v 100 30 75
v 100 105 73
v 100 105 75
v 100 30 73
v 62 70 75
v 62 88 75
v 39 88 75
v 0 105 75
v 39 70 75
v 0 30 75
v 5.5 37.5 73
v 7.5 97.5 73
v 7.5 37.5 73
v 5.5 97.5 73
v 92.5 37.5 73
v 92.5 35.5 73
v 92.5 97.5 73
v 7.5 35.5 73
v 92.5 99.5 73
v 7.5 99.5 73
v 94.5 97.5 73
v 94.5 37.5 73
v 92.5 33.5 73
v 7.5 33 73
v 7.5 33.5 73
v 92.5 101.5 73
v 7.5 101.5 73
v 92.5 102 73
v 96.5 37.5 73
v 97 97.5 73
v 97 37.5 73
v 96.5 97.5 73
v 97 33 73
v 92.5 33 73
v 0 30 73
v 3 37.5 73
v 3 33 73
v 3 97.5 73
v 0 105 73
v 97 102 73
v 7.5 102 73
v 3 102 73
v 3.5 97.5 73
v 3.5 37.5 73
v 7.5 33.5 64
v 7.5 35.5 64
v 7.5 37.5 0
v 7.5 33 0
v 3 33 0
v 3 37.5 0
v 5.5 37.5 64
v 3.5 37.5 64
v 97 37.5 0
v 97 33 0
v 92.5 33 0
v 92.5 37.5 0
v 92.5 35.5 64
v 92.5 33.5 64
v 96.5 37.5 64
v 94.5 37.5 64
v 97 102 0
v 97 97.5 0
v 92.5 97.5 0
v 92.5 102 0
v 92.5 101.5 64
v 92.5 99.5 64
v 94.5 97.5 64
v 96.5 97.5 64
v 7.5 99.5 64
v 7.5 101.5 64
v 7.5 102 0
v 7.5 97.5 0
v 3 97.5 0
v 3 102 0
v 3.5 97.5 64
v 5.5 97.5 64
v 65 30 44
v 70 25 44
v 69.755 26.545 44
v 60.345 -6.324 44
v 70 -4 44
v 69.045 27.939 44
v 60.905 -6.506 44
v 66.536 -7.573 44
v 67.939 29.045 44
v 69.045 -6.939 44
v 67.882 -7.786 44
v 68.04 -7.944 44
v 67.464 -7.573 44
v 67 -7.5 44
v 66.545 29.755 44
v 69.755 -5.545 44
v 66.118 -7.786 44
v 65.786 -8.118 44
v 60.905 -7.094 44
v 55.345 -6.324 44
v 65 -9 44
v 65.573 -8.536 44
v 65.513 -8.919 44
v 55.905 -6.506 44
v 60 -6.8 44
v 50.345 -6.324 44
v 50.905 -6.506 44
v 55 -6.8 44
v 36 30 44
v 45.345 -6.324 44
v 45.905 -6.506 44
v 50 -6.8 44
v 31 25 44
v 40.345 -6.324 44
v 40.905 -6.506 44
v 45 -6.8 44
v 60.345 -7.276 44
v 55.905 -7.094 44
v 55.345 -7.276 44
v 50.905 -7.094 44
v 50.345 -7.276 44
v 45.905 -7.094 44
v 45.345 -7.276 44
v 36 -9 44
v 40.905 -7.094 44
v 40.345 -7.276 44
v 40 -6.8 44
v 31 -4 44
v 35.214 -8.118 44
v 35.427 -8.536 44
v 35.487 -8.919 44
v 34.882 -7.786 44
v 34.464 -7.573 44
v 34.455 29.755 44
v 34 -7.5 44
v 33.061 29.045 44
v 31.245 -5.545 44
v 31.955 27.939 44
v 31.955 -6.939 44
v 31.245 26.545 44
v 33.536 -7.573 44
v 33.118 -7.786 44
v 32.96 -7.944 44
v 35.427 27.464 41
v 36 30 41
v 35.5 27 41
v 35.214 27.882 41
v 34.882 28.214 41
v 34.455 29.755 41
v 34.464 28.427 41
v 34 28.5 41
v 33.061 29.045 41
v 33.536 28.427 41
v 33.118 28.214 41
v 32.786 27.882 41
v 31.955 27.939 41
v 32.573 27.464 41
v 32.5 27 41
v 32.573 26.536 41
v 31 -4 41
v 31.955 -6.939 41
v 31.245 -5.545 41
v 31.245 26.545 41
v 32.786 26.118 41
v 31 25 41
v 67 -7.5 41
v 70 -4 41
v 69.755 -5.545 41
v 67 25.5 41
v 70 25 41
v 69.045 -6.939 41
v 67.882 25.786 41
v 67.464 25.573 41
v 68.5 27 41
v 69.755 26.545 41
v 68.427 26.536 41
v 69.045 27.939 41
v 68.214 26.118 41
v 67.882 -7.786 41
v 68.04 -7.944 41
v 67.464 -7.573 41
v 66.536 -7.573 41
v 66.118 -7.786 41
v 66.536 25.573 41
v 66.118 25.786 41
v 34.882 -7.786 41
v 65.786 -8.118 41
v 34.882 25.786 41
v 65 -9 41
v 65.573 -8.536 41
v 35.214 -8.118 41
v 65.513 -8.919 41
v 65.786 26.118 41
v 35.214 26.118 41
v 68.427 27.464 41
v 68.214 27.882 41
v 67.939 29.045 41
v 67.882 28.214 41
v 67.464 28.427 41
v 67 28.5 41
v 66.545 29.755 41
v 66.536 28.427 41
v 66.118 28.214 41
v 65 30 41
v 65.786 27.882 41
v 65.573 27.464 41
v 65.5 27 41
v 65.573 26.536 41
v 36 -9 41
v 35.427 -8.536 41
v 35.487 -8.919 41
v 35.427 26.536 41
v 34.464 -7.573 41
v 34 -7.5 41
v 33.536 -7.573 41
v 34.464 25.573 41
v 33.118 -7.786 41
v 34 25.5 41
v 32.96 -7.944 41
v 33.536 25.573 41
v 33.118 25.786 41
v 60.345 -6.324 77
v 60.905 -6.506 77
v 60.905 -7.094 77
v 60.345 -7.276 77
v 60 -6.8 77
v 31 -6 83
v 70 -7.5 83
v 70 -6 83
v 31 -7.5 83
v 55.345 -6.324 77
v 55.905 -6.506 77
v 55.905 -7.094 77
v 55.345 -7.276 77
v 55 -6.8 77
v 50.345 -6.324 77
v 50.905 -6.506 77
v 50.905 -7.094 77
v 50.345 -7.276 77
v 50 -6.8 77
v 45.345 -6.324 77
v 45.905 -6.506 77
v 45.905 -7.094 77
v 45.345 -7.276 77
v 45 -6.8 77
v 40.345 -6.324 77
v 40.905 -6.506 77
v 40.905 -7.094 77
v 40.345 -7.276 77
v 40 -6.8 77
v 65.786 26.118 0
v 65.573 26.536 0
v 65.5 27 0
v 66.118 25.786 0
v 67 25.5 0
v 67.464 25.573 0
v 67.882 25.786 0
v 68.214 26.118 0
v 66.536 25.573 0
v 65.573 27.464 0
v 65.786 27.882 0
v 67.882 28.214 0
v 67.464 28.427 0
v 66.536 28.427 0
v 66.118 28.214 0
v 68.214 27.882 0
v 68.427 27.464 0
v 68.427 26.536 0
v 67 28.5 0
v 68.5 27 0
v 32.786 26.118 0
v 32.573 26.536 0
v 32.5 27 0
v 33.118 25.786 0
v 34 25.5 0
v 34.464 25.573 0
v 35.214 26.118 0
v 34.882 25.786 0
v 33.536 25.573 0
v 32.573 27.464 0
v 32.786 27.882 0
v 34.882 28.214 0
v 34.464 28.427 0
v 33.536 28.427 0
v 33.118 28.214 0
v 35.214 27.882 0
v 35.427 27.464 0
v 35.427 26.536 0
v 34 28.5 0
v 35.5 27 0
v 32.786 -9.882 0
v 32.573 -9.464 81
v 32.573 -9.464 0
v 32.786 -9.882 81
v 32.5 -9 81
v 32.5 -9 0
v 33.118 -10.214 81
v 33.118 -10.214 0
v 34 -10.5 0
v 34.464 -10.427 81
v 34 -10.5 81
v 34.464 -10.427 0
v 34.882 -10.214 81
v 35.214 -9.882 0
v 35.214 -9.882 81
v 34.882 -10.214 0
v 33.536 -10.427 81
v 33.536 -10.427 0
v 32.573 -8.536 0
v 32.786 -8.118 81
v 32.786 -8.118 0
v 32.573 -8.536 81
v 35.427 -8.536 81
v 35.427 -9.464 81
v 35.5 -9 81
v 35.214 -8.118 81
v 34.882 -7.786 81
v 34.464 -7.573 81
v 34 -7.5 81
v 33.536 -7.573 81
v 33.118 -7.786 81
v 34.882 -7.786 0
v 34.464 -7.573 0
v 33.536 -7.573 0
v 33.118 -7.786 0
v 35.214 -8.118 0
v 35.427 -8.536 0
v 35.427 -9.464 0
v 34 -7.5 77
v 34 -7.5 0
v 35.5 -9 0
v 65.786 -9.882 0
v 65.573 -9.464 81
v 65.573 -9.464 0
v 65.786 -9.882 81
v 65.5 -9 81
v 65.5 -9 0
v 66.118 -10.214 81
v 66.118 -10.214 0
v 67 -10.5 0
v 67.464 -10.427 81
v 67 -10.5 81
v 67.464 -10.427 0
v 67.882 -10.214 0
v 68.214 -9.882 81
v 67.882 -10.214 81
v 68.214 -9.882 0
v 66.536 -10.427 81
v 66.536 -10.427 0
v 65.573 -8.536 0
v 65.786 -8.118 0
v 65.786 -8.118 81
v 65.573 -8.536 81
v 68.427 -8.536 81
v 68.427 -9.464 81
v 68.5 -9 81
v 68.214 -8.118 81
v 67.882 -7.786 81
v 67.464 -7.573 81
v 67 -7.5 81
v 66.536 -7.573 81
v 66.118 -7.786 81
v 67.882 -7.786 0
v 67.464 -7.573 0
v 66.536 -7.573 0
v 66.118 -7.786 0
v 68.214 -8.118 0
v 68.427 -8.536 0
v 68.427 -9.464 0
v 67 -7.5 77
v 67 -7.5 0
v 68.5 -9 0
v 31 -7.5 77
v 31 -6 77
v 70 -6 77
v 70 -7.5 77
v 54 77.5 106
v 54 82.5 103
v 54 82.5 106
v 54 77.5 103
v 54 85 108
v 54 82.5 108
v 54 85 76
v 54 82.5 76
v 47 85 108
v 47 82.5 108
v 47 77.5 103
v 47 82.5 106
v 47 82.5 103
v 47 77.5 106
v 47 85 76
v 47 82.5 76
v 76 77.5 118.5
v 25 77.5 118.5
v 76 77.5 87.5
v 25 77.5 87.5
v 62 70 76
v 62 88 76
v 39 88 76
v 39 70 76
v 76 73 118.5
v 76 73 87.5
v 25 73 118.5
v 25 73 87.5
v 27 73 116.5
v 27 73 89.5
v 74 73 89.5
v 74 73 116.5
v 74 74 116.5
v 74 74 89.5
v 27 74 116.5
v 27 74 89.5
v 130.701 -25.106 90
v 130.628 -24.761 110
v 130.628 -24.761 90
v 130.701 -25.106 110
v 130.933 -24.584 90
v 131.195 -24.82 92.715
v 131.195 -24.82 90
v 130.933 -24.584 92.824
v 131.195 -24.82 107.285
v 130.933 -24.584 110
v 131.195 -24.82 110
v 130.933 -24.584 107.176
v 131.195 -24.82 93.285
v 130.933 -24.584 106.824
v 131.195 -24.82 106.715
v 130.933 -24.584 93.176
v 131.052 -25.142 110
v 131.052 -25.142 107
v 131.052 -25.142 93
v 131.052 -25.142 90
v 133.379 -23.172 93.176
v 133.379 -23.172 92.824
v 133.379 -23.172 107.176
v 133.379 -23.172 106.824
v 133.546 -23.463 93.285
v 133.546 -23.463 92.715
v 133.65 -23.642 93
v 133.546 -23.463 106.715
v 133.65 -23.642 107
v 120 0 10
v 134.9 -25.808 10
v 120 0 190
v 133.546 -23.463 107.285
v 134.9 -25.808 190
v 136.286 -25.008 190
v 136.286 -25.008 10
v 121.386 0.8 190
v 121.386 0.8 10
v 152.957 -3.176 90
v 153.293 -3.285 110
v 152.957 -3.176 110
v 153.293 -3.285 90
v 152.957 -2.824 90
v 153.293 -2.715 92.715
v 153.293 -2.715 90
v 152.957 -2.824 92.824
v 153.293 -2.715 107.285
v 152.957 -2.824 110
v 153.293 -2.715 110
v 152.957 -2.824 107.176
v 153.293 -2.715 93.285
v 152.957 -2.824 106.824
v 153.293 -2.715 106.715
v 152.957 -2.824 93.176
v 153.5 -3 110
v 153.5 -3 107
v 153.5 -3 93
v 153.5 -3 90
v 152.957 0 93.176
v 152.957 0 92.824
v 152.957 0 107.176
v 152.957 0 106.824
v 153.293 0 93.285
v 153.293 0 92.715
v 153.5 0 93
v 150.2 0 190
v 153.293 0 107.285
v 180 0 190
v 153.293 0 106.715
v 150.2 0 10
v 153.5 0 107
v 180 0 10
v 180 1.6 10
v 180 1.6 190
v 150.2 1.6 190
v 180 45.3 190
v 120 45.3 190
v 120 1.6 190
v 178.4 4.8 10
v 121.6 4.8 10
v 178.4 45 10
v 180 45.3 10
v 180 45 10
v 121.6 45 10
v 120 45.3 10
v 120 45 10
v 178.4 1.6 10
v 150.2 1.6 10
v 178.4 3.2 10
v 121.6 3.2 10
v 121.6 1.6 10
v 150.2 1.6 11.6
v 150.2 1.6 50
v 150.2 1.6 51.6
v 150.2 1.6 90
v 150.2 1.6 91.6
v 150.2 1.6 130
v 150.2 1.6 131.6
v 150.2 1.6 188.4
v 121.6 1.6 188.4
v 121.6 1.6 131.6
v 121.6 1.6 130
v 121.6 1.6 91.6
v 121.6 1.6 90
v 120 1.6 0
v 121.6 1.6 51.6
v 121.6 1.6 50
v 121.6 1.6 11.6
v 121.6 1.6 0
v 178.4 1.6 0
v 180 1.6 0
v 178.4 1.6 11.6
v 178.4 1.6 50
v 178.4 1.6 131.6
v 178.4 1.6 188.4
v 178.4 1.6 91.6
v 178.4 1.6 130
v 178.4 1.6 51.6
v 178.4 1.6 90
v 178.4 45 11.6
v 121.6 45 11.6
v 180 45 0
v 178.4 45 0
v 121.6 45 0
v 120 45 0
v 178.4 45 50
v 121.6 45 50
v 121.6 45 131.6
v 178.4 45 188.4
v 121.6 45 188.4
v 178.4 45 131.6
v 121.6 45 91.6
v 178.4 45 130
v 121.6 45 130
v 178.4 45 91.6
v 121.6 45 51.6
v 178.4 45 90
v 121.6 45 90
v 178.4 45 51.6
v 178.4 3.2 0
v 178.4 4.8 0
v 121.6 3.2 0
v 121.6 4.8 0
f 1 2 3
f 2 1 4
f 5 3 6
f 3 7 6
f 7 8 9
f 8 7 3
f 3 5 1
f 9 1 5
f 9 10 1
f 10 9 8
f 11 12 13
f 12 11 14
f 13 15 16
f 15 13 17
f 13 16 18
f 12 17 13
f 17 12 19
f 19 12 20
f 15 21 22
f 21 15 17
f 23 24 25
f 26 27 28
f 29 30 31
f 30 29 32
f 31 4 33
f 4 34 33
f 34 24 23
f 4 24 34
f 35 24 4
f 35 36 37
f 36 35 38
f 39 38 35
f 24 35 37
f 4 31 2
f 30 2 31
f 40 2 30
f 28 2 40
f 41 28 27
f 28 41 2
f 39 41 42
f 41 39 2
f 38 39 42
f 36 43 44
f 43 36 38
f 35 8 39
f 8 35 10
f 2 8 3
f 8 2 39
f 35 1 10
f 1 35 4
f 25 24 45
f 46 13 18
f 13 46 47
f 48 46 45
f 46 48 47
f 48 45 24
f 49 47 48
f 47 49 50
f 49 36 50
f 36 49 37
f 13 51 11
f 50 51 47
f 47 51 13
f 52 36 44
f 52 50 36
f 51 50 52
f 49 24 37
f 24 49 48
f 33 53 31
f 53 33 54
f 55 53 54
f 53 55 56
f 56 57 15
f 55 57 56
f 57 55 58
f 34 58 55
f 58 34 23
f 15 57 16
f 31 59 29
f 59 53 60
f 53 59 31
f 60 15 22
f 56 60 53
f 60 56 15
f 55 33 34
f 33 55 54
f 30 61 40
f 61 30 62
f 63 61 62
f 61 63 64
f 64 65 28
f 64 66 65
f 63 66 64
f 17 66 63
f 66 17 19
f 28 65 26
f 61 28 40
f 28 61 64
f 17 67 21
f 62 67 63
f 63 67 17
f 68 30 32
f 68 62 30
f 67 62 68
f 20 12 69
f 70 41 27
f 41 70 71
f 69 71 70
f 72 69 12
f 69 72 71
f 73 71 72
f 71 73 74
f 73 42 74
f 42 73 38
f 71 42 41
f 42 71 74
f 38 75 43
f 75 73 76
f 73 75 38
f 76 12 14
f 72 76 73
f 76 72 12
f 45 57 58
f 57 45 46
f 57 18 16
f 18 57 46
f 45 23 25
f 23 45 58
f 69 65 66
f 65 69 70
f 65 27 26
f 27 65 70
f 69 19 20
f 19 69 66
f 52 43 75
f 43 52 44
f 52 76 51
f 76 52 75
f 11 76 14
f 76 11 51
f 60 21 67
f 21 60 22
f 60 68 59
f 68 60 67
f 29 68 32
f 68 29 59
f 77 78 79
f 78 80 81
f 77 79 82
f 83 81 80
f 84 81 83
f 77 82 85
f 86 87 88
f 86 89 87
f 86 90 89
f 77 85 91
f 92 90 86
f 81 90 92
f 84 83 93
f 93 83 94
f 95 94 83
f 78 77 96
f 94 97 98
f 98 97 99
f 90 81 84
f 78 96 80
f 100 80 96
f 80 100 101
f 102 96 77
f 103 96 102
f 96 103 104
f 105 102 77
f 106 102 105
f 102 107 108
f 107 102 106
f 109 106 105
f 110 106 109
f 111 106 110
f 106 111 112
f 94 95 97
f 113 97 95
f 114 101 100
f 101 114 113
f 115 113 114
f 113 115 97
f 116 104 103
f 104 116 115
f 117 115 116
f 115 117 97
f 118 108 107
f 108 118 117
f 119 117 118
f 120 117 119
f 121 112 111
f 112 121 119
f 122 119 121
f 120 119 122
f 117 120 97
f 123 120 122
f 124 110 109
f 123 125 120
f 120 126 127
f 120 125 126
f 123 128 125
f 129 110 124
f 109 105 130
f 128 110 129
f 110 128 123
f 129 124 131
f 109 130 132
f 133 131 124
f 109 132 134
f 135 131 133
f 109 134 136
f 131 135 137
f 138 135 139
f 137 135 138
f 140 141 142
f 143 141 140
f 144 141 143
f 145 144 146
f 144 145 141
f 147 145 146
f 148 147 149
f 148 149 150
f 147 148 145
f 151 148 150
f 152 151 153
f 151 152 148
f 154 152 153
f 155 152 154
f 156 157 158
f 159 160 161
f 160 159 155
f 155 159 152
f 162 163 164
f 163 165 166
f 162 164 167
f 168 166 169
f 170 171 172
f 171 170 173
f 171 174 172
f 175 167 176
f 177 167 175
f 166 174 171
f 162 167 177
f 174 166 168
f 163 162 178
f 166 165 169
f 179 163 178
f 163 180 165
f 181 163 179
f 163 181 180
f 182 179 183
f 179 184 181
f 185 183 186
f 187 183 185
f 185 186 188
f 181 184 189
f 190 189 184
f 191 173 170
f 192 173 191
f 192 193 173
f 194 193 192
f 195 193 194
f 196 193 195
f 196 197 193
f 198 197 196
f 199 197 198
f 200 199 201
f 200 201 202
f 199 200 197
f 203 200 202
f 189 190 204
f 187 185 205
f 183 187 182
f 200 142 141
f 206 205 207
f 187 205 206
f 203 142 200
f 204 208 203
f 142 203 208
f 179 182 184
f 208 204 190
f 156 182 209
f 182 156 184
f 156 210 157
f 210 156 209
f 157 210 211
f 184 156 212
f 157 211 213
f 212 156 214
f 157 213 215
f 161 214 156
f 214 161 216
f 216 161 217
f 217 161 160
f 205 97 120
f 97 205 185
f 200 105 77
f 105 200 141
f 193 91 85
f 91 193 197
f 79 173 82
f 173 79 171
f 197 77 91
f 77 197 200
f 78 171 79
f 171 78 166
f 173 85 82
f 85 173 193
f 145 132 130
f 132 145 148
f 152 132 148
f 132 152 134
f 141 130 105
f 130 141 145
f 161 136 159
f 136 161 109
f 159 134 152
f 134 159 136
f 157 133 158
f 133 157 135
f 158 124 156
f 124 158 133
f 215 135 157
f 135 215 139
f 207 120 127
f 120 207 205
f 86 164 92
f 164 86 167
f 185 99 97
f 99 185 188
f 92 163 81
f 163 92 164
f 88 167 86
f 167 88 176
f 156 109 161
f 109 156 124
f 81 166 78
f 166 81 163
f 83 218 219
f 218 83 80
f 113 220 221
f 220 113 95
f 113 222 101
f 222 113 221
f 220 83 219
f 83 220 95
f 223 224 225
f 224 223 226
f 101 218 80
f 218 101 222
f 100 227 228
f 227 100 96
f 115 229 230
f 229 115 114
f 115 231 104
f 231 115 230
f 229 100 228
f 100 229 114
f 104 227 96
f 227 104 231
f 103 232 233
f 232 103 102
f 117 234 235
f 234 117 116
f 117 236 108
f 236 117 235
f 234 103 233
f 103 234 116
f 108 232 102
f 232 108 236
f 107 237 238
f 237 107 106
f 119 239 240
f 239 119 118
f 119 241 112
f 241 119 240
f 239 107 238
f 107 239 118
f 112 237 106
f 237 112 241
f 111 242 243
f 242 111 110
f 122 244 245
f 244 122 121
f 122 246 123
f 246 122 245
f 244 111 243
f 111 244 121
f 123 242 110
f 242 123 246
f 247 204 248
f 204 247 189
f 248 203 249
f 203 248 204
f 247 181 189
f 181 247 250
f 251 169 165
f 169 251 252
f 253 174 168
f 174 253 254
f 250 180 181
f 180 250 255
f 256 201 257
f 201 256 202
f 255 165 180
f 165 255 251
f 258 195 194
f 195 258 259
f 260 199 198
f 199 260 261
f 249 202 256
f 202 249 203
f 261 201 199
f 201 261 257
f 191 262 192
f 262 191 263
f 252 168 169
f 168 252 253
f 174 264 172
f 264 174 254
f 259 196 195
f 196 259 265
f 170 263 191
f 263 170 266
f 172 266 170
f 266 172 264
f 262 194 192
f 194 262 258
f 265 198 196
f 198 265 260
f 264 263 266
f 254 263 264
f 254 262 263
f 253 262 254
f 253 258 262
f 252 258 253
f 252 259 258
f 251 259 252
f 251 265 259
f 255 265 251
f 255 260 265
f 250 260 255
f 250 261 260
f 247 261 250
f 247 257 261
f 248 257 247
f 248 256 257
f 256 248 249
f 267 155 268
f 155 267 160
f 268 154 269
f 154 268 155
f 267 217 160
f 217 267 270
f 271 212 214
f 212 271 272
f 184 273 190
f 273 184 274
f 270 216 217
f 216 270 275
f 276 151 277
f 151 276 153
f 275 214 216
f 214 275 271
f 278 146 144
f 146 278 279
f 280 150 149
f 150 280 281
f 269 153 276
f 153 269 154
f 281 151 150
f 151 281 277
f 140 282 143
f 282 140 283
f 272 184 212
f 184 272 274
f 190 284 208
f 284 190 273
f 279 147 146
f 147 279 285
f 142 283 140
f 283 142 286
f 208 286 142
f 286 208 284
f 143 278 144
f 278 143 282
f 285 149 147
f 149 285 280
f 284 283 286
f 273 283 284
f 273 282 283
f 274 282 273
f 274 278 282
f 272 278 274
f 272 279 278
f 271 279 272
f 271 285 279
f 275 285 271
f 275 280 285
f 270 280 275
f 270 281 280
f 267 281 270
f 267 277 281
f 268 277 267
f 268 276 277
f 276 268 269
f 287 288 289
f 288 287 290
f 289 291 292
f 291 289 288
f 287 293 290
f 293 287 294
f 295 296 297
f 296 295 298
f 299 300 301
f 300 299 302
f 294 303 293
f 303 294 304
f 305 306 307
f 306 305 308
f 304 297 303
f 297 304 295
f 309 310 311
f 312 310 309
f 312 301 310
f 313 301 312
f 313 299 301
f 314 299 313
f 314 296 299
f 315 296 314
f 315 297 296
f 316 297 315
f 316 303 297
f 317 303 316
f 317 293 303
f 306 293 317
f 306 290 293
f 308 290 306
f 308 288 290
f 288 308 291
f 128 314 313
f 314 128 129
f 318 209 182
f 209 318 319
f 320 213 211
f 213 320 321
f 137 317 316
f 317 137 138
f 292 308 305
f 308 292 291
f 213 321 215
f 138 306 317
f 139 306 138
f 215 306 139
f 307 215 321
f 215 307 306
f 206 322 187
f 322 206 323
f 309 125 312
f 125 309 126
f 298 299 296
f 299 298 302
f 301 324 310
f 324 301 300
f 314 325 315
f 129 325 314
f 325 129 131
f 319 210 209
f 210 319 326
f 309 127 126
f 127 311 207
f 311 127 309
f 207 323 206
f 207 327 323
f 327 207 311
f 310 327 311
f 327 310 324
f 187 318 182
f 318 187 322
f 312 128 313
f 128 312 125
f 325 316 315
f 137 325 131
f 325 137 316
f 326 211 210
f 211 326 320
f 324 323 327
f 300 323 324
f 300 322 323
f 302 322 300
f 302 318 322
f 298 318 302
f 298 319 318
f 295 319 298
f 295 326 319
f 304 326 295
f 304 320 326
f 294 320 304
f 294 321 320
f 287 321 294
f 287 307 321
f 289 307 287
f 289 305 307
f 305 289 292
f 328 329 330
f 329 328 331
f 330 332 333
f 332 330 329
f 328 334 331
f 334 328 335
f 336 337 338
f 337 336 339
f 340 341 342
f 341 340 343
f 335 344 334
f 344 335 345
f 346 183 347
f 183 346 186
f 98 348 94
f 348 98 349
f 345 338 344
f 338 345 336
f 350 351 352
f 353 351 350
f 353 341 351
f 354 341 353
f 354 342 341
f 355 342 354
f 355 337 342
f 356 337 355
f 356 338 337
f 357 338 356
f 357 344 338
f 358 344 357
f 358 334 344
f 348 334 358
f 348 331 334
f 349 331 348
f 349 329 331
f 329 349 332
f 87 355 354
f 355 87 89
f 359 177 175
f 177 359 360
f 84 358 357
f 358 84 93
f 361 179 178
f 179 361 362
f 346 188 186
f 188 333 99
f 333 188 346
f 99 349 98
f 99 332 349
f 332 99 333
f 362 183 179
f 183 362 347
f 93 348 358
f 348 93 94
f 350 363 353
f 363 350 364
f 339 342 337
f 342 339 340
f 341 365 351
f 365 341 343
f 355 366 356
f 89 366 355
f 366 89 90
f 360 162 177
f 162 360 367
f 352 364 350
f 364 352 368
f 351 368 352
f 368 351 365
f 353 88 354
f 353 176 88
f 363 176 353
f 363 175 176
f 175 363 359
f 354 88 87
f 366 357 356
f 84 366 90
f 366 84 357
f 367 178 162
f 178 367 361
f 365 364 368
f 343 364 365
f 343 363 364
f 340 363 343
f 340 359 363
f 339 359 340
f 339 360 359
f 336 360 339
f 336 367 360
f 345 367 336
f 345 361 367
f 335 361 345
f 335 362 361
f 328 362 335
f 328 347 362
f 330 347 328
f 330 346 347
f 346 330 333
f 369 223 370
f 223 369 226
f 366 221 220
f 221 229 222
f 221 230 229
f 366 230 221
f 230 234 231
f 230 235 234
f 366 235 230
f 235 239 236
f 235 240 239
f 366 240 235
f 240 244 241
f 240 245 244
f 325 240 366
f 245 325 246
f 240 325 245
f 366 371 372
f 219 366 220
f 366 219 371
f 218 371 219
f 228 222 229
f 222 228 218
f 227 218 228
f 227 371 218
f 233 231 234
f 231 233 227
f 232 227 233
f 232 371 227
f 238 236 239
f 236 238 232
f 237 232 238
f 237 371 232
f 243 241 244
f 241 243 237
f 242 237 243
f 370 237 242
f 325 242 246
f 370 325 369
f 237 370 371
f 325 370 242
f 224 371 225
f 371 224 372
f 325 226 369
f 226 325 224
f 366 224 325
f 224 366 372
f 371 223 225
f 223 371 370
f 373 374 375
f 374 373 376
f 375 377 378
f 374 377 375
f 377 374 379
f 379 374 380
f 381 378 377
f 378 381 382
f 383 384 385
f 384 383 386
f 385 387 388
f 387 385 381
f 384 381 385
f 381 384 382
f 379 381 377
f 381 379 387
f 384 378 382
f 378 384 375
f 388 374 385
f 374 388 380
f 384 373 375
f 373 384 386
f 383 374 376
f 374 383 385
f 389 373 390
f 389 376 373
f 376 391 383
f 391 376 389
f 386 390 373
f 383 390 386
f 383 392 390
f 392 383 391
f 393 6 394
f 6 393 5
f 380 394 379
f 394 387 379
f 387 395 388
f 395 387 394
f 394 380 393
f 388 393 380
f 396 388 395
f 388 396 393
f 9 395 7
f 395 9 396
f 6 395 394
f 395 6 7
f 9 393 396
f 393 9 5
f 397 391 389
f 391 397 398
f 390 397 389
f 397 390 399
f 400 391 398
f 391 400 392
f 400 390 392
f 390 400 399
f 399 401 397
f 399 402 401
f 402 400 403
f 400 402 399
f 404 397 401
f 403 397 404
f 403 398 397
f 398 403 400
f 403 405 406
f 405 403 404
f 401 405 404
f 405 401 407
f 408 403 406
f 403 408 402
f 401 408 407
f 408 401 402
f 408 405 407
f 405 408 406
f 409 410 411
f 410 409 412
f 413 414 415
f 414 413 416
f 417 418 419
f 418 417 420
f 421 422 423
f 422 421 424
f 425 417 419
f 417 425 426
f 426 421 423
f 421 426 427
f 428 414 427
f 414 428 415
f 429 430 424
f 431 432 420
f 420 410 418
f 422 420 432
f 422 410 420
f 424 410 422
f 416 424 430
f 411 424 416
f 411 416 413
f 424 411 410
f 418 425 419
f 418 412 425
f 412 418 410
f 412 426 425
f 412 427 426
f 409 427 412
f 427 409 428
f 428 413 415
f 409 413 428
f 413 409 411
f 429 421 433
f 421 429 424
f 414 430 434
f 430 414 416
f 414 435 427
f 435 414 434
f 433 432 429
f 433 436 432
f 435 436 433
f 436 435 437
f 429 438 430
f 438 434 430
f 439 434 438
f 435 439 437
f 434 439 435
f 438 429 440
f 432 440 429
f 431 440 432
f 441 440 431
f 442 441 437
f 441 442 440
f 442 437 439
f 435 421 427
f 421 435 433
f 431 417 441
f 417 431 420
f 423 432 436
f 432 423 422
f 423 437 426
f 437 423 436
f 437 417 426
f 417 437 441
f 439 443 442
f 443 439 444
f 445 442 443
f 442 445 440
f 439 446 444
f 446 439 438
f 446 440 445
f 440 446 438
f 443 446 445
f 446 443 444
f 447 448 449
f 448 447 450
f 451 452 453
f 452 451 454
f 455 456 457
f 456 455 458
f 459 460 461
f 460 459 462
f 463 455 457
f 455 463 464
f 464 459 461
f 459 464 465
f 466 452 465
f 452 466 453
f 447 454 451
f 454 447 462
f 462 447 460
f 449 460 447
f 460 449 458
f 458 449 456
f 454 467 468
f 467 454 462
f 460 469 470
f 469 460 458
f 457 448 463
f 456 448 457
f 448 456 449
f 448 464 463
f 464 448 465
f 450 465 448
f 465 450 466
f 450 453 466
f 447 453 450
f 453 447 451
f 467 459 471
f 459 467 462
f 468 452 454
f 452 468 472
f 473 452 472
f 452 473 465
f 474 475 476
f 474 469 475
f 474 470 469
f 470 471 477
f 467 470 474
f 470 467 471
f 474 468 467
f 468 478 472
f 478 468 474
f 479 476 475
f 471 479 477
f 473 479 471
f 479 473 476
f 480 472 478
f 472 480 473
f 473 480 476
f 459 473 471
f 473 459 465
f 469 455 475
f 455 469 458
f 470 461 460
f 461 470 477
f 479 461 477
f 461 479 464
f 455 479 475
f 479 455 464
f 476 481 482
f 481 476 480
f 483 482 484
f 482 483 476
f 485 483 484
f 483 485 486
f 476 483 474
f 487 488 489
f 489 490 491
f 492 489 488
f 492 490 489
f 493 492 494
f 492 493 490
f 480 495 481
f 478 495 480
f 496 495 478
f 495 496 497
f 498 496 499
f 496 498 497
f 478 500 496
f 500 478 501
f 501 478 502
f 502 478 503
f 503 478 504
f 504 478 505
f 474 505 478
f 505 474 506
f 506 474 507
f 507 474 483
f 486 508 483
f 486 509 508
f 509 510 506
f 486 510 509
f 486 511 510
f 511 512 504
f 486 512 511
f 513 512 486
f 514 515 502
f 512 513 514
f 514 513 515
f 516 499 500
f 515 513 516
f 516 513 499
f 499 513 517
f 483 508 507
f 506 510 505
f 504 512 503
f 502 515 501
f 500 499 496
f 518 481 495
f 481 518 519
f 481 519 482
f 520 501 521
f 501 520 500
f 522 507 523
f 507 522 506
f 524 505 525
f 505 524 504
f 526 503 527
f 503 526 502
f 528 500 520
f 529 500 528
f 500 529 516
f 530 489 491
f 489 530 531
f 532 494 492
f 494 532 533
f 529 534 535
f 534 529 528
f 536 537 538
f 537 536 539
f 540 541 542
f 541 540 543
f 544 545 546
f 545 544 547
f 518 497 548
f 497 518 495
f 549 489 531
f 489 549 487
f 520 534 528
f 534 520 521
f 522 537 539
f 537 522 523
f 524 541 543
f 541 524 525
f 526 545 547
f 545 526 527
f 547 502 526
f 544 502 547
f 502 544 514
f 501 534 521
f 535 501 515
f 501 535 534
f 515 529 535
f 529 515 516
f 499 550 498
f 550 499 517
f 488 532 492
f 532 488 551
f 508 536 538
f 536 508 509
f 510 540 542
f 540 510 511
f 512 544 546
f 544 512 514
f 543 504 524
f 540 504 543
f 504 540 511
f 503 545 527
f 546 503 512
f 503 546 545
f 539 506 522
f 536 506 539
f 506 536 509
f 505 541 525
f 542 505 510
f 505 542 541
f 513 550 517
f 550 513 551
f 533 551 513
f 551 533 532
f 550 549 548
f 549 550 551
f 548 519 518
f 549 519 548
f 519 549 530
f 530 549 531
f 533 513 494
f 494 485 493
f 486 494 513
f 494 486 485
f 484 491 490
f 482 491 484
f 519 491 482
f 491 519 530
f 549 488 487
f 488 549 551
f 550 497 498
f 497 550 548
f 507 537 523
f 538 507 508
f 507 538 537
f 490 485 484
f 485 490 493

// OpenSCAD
// file: wardrobe.scad
module wardrobe(W=60, H=190, D=45)
{
	d=1.6; // толщина стенок

	// дверцы
	{
		translate([0, 0, 10]) rotate([0,0,-60])
		{
			color("BlanchedAlmond") wardrobe_door(W, H-10, d);
			translate([W/2-3, -3, 80]) wardrobe_knob();
		}
		color("BlanchedAlmond")
		translate([W/2+0.2, 0, 10])
		{
			wardrobe_door(W, H-10, d);
			translate([3, -3, 80]) wardrobe_knob();
		}
	}

	// боковые стенки
	color([0.2,0.2,0.2])
	{
		translate([0,   d, 0]) cube([d, D-d, H]); // левая
		translate([W-d, d, 0]) cube([d, D-d, H]); // правая
		translate([d,   2*d, 0]) cube([W-2*d, d, 10]); // нижняя заглушка
		translate([d, d,  10]) cube([W-2*d, D-d, d]); // пол
		translate([d, d, H-d]) cube([W-2*d, D-d, d]); // потолок
		for(h = [10 : 40 : H-40])
		translate([d, d,   h]) cube([W-2*d, D-d, d]); // полки
	}

	// задняя стенка
	color("Burlywood")
	translate([0, D, 10]) cube([W, 0.3, H-10]);
}

module wardrobe_door(W, H, d)
{
	color("BlanchedAlmond")
	cube([W/2-0.2, d, H]);
}
module wardrobe_knob()
{
	color("White")
	{
		cylinder(20, 0.3, 0.3);
		translate([0, 0, 3]) rotate([-90,0,0]) cylinder(3,  0.3, 0.3);
		translate([0, 0, 20-3]) rotate([-90,0,0]) cylinder(3,  0.3, 0.3);
	}
}
// file: monitor.scad
module monitor()
{
	W=51; H=31;
	// ножка
	nl=23; nw=18; nh=33;
	color("lightgray")
	translate([(W-nl)/2,0,0]){
		cube([nl, nw, 1]);
		translate([(nl-7)/2,  nw-3-2.5,0])
		{
			cube([7, 2.5, 33]);
			translate([0, -5, nh-5]) cube([7, 5, 3]);
		}
	}
	// экран
	d=4.5;
	translate([0, nw-3-2.5-5-d, nh-5-H/2])
	difference() {
		color("black") cube([W, d, H]);
		color("white") translate([2, 0, 2]) cube([W-4, 1, H-4]);
	}
}
// file: chair.scad
module chair()
{
	w=39; h=41; d=3;
	color("chocolate")
	translate([0, 0, h]) union() {
		r=5;
		translate([r,0]) cube([w-2*r,w,d]);
		translate([  r,  r,0]) cylinder(h=d,r=5, $fn=20);
		translate([w-r,  r,0]) cylinder(h=d,r=5, $fn=20);
		translate([w-r,w-r,0]) cylinder(h=d,r=5, $fn=20);
		translate([  r,w-r,0]) cylinder(h=d,r=5, $fn=20);
		translate([0,r]) cube([w,w-2*r,d]);
	}

	// передние ножки
	r=1.5; o=3;
	translate([  o,   o, 0]) cylinder(h=h,r=r, $fn=20);
	translate([w-o,   o, 0]) cylinder(h=h,r=r, $fn=20);

	// задние ножки
	H=83;
	translate([w-o, w, 0]) cylinder(h=H-2,r=r, $fn=20);
	translate([  o, w, 0]) cylinder(h=H-2,r=r, $fn=20);

	// спинка
	translate([0, w-r-1.5, H-6]) cube([w,1.5,6]);
	translate([-0.5, w-r-0.7, h]) {
	translate([10, 0, 0]) cylinder(h=H-h,r=0.5);
	translate([15, 0, 0]) cylinder(h=H-h,r=0.5);
	translate([20, 0, 0]) cylinder(h=H-h,r=0.5);
	translate([25, 0, 0]) cylinder(h=H-h,r=0.5);
	translate([30, 0, 0]) cylinder(h=H-h,r=0.5);
	}
}
// file: computer_table.scad
module computer_table(L=100, W=75, H=75)
{
	// столешница
	d=2;
	color("chocolate")
	translate([0, 0, H-d]) cube([L,W,d]);

	// ножки
	n=4.5; o=3;
	translate([    o,     o, 0]) cube([n,n,H-d]);
	translate([L-o-n,     o, 0]) cube([n,n,H-d]);
	translate([L-o-n, W-o-n, 0]) cube([n,n,H-d]);
	translate([    o, W-o-n, 0]) cube([n,n,H-d]);

	// обвязка
	h=9; t=0.5;
	translate([    n+o,     o+t, H-d-h]) cube([L-2*(n+o),d,h]);
	translate([    n+o, W-o-d-t, H-d-h]) cube([L-2*(n+o),d,h]);
	rotate(90) translate([n+o, -o-d-t, H-d-h]) cube([W-2*(n+o),d,h]);
	rotate(90) translate([n+o, -L+o+t, H-d-h]) cube([W-2*(n+o),d,h]);
}
// file: all.scad
include <computer_table.scad>;
include <chair.scad>;
include <monitor.scad>;
include <wardrobe.scad>;
// main file
include <all.scad>;

translate([ 0, 30]) computer_table();
translate([70, 30]) rotate([0, 0, 180]) chair();
translate([25, 70, 75]) monitor();
translate([120, 0, 0]) wardrobe();
